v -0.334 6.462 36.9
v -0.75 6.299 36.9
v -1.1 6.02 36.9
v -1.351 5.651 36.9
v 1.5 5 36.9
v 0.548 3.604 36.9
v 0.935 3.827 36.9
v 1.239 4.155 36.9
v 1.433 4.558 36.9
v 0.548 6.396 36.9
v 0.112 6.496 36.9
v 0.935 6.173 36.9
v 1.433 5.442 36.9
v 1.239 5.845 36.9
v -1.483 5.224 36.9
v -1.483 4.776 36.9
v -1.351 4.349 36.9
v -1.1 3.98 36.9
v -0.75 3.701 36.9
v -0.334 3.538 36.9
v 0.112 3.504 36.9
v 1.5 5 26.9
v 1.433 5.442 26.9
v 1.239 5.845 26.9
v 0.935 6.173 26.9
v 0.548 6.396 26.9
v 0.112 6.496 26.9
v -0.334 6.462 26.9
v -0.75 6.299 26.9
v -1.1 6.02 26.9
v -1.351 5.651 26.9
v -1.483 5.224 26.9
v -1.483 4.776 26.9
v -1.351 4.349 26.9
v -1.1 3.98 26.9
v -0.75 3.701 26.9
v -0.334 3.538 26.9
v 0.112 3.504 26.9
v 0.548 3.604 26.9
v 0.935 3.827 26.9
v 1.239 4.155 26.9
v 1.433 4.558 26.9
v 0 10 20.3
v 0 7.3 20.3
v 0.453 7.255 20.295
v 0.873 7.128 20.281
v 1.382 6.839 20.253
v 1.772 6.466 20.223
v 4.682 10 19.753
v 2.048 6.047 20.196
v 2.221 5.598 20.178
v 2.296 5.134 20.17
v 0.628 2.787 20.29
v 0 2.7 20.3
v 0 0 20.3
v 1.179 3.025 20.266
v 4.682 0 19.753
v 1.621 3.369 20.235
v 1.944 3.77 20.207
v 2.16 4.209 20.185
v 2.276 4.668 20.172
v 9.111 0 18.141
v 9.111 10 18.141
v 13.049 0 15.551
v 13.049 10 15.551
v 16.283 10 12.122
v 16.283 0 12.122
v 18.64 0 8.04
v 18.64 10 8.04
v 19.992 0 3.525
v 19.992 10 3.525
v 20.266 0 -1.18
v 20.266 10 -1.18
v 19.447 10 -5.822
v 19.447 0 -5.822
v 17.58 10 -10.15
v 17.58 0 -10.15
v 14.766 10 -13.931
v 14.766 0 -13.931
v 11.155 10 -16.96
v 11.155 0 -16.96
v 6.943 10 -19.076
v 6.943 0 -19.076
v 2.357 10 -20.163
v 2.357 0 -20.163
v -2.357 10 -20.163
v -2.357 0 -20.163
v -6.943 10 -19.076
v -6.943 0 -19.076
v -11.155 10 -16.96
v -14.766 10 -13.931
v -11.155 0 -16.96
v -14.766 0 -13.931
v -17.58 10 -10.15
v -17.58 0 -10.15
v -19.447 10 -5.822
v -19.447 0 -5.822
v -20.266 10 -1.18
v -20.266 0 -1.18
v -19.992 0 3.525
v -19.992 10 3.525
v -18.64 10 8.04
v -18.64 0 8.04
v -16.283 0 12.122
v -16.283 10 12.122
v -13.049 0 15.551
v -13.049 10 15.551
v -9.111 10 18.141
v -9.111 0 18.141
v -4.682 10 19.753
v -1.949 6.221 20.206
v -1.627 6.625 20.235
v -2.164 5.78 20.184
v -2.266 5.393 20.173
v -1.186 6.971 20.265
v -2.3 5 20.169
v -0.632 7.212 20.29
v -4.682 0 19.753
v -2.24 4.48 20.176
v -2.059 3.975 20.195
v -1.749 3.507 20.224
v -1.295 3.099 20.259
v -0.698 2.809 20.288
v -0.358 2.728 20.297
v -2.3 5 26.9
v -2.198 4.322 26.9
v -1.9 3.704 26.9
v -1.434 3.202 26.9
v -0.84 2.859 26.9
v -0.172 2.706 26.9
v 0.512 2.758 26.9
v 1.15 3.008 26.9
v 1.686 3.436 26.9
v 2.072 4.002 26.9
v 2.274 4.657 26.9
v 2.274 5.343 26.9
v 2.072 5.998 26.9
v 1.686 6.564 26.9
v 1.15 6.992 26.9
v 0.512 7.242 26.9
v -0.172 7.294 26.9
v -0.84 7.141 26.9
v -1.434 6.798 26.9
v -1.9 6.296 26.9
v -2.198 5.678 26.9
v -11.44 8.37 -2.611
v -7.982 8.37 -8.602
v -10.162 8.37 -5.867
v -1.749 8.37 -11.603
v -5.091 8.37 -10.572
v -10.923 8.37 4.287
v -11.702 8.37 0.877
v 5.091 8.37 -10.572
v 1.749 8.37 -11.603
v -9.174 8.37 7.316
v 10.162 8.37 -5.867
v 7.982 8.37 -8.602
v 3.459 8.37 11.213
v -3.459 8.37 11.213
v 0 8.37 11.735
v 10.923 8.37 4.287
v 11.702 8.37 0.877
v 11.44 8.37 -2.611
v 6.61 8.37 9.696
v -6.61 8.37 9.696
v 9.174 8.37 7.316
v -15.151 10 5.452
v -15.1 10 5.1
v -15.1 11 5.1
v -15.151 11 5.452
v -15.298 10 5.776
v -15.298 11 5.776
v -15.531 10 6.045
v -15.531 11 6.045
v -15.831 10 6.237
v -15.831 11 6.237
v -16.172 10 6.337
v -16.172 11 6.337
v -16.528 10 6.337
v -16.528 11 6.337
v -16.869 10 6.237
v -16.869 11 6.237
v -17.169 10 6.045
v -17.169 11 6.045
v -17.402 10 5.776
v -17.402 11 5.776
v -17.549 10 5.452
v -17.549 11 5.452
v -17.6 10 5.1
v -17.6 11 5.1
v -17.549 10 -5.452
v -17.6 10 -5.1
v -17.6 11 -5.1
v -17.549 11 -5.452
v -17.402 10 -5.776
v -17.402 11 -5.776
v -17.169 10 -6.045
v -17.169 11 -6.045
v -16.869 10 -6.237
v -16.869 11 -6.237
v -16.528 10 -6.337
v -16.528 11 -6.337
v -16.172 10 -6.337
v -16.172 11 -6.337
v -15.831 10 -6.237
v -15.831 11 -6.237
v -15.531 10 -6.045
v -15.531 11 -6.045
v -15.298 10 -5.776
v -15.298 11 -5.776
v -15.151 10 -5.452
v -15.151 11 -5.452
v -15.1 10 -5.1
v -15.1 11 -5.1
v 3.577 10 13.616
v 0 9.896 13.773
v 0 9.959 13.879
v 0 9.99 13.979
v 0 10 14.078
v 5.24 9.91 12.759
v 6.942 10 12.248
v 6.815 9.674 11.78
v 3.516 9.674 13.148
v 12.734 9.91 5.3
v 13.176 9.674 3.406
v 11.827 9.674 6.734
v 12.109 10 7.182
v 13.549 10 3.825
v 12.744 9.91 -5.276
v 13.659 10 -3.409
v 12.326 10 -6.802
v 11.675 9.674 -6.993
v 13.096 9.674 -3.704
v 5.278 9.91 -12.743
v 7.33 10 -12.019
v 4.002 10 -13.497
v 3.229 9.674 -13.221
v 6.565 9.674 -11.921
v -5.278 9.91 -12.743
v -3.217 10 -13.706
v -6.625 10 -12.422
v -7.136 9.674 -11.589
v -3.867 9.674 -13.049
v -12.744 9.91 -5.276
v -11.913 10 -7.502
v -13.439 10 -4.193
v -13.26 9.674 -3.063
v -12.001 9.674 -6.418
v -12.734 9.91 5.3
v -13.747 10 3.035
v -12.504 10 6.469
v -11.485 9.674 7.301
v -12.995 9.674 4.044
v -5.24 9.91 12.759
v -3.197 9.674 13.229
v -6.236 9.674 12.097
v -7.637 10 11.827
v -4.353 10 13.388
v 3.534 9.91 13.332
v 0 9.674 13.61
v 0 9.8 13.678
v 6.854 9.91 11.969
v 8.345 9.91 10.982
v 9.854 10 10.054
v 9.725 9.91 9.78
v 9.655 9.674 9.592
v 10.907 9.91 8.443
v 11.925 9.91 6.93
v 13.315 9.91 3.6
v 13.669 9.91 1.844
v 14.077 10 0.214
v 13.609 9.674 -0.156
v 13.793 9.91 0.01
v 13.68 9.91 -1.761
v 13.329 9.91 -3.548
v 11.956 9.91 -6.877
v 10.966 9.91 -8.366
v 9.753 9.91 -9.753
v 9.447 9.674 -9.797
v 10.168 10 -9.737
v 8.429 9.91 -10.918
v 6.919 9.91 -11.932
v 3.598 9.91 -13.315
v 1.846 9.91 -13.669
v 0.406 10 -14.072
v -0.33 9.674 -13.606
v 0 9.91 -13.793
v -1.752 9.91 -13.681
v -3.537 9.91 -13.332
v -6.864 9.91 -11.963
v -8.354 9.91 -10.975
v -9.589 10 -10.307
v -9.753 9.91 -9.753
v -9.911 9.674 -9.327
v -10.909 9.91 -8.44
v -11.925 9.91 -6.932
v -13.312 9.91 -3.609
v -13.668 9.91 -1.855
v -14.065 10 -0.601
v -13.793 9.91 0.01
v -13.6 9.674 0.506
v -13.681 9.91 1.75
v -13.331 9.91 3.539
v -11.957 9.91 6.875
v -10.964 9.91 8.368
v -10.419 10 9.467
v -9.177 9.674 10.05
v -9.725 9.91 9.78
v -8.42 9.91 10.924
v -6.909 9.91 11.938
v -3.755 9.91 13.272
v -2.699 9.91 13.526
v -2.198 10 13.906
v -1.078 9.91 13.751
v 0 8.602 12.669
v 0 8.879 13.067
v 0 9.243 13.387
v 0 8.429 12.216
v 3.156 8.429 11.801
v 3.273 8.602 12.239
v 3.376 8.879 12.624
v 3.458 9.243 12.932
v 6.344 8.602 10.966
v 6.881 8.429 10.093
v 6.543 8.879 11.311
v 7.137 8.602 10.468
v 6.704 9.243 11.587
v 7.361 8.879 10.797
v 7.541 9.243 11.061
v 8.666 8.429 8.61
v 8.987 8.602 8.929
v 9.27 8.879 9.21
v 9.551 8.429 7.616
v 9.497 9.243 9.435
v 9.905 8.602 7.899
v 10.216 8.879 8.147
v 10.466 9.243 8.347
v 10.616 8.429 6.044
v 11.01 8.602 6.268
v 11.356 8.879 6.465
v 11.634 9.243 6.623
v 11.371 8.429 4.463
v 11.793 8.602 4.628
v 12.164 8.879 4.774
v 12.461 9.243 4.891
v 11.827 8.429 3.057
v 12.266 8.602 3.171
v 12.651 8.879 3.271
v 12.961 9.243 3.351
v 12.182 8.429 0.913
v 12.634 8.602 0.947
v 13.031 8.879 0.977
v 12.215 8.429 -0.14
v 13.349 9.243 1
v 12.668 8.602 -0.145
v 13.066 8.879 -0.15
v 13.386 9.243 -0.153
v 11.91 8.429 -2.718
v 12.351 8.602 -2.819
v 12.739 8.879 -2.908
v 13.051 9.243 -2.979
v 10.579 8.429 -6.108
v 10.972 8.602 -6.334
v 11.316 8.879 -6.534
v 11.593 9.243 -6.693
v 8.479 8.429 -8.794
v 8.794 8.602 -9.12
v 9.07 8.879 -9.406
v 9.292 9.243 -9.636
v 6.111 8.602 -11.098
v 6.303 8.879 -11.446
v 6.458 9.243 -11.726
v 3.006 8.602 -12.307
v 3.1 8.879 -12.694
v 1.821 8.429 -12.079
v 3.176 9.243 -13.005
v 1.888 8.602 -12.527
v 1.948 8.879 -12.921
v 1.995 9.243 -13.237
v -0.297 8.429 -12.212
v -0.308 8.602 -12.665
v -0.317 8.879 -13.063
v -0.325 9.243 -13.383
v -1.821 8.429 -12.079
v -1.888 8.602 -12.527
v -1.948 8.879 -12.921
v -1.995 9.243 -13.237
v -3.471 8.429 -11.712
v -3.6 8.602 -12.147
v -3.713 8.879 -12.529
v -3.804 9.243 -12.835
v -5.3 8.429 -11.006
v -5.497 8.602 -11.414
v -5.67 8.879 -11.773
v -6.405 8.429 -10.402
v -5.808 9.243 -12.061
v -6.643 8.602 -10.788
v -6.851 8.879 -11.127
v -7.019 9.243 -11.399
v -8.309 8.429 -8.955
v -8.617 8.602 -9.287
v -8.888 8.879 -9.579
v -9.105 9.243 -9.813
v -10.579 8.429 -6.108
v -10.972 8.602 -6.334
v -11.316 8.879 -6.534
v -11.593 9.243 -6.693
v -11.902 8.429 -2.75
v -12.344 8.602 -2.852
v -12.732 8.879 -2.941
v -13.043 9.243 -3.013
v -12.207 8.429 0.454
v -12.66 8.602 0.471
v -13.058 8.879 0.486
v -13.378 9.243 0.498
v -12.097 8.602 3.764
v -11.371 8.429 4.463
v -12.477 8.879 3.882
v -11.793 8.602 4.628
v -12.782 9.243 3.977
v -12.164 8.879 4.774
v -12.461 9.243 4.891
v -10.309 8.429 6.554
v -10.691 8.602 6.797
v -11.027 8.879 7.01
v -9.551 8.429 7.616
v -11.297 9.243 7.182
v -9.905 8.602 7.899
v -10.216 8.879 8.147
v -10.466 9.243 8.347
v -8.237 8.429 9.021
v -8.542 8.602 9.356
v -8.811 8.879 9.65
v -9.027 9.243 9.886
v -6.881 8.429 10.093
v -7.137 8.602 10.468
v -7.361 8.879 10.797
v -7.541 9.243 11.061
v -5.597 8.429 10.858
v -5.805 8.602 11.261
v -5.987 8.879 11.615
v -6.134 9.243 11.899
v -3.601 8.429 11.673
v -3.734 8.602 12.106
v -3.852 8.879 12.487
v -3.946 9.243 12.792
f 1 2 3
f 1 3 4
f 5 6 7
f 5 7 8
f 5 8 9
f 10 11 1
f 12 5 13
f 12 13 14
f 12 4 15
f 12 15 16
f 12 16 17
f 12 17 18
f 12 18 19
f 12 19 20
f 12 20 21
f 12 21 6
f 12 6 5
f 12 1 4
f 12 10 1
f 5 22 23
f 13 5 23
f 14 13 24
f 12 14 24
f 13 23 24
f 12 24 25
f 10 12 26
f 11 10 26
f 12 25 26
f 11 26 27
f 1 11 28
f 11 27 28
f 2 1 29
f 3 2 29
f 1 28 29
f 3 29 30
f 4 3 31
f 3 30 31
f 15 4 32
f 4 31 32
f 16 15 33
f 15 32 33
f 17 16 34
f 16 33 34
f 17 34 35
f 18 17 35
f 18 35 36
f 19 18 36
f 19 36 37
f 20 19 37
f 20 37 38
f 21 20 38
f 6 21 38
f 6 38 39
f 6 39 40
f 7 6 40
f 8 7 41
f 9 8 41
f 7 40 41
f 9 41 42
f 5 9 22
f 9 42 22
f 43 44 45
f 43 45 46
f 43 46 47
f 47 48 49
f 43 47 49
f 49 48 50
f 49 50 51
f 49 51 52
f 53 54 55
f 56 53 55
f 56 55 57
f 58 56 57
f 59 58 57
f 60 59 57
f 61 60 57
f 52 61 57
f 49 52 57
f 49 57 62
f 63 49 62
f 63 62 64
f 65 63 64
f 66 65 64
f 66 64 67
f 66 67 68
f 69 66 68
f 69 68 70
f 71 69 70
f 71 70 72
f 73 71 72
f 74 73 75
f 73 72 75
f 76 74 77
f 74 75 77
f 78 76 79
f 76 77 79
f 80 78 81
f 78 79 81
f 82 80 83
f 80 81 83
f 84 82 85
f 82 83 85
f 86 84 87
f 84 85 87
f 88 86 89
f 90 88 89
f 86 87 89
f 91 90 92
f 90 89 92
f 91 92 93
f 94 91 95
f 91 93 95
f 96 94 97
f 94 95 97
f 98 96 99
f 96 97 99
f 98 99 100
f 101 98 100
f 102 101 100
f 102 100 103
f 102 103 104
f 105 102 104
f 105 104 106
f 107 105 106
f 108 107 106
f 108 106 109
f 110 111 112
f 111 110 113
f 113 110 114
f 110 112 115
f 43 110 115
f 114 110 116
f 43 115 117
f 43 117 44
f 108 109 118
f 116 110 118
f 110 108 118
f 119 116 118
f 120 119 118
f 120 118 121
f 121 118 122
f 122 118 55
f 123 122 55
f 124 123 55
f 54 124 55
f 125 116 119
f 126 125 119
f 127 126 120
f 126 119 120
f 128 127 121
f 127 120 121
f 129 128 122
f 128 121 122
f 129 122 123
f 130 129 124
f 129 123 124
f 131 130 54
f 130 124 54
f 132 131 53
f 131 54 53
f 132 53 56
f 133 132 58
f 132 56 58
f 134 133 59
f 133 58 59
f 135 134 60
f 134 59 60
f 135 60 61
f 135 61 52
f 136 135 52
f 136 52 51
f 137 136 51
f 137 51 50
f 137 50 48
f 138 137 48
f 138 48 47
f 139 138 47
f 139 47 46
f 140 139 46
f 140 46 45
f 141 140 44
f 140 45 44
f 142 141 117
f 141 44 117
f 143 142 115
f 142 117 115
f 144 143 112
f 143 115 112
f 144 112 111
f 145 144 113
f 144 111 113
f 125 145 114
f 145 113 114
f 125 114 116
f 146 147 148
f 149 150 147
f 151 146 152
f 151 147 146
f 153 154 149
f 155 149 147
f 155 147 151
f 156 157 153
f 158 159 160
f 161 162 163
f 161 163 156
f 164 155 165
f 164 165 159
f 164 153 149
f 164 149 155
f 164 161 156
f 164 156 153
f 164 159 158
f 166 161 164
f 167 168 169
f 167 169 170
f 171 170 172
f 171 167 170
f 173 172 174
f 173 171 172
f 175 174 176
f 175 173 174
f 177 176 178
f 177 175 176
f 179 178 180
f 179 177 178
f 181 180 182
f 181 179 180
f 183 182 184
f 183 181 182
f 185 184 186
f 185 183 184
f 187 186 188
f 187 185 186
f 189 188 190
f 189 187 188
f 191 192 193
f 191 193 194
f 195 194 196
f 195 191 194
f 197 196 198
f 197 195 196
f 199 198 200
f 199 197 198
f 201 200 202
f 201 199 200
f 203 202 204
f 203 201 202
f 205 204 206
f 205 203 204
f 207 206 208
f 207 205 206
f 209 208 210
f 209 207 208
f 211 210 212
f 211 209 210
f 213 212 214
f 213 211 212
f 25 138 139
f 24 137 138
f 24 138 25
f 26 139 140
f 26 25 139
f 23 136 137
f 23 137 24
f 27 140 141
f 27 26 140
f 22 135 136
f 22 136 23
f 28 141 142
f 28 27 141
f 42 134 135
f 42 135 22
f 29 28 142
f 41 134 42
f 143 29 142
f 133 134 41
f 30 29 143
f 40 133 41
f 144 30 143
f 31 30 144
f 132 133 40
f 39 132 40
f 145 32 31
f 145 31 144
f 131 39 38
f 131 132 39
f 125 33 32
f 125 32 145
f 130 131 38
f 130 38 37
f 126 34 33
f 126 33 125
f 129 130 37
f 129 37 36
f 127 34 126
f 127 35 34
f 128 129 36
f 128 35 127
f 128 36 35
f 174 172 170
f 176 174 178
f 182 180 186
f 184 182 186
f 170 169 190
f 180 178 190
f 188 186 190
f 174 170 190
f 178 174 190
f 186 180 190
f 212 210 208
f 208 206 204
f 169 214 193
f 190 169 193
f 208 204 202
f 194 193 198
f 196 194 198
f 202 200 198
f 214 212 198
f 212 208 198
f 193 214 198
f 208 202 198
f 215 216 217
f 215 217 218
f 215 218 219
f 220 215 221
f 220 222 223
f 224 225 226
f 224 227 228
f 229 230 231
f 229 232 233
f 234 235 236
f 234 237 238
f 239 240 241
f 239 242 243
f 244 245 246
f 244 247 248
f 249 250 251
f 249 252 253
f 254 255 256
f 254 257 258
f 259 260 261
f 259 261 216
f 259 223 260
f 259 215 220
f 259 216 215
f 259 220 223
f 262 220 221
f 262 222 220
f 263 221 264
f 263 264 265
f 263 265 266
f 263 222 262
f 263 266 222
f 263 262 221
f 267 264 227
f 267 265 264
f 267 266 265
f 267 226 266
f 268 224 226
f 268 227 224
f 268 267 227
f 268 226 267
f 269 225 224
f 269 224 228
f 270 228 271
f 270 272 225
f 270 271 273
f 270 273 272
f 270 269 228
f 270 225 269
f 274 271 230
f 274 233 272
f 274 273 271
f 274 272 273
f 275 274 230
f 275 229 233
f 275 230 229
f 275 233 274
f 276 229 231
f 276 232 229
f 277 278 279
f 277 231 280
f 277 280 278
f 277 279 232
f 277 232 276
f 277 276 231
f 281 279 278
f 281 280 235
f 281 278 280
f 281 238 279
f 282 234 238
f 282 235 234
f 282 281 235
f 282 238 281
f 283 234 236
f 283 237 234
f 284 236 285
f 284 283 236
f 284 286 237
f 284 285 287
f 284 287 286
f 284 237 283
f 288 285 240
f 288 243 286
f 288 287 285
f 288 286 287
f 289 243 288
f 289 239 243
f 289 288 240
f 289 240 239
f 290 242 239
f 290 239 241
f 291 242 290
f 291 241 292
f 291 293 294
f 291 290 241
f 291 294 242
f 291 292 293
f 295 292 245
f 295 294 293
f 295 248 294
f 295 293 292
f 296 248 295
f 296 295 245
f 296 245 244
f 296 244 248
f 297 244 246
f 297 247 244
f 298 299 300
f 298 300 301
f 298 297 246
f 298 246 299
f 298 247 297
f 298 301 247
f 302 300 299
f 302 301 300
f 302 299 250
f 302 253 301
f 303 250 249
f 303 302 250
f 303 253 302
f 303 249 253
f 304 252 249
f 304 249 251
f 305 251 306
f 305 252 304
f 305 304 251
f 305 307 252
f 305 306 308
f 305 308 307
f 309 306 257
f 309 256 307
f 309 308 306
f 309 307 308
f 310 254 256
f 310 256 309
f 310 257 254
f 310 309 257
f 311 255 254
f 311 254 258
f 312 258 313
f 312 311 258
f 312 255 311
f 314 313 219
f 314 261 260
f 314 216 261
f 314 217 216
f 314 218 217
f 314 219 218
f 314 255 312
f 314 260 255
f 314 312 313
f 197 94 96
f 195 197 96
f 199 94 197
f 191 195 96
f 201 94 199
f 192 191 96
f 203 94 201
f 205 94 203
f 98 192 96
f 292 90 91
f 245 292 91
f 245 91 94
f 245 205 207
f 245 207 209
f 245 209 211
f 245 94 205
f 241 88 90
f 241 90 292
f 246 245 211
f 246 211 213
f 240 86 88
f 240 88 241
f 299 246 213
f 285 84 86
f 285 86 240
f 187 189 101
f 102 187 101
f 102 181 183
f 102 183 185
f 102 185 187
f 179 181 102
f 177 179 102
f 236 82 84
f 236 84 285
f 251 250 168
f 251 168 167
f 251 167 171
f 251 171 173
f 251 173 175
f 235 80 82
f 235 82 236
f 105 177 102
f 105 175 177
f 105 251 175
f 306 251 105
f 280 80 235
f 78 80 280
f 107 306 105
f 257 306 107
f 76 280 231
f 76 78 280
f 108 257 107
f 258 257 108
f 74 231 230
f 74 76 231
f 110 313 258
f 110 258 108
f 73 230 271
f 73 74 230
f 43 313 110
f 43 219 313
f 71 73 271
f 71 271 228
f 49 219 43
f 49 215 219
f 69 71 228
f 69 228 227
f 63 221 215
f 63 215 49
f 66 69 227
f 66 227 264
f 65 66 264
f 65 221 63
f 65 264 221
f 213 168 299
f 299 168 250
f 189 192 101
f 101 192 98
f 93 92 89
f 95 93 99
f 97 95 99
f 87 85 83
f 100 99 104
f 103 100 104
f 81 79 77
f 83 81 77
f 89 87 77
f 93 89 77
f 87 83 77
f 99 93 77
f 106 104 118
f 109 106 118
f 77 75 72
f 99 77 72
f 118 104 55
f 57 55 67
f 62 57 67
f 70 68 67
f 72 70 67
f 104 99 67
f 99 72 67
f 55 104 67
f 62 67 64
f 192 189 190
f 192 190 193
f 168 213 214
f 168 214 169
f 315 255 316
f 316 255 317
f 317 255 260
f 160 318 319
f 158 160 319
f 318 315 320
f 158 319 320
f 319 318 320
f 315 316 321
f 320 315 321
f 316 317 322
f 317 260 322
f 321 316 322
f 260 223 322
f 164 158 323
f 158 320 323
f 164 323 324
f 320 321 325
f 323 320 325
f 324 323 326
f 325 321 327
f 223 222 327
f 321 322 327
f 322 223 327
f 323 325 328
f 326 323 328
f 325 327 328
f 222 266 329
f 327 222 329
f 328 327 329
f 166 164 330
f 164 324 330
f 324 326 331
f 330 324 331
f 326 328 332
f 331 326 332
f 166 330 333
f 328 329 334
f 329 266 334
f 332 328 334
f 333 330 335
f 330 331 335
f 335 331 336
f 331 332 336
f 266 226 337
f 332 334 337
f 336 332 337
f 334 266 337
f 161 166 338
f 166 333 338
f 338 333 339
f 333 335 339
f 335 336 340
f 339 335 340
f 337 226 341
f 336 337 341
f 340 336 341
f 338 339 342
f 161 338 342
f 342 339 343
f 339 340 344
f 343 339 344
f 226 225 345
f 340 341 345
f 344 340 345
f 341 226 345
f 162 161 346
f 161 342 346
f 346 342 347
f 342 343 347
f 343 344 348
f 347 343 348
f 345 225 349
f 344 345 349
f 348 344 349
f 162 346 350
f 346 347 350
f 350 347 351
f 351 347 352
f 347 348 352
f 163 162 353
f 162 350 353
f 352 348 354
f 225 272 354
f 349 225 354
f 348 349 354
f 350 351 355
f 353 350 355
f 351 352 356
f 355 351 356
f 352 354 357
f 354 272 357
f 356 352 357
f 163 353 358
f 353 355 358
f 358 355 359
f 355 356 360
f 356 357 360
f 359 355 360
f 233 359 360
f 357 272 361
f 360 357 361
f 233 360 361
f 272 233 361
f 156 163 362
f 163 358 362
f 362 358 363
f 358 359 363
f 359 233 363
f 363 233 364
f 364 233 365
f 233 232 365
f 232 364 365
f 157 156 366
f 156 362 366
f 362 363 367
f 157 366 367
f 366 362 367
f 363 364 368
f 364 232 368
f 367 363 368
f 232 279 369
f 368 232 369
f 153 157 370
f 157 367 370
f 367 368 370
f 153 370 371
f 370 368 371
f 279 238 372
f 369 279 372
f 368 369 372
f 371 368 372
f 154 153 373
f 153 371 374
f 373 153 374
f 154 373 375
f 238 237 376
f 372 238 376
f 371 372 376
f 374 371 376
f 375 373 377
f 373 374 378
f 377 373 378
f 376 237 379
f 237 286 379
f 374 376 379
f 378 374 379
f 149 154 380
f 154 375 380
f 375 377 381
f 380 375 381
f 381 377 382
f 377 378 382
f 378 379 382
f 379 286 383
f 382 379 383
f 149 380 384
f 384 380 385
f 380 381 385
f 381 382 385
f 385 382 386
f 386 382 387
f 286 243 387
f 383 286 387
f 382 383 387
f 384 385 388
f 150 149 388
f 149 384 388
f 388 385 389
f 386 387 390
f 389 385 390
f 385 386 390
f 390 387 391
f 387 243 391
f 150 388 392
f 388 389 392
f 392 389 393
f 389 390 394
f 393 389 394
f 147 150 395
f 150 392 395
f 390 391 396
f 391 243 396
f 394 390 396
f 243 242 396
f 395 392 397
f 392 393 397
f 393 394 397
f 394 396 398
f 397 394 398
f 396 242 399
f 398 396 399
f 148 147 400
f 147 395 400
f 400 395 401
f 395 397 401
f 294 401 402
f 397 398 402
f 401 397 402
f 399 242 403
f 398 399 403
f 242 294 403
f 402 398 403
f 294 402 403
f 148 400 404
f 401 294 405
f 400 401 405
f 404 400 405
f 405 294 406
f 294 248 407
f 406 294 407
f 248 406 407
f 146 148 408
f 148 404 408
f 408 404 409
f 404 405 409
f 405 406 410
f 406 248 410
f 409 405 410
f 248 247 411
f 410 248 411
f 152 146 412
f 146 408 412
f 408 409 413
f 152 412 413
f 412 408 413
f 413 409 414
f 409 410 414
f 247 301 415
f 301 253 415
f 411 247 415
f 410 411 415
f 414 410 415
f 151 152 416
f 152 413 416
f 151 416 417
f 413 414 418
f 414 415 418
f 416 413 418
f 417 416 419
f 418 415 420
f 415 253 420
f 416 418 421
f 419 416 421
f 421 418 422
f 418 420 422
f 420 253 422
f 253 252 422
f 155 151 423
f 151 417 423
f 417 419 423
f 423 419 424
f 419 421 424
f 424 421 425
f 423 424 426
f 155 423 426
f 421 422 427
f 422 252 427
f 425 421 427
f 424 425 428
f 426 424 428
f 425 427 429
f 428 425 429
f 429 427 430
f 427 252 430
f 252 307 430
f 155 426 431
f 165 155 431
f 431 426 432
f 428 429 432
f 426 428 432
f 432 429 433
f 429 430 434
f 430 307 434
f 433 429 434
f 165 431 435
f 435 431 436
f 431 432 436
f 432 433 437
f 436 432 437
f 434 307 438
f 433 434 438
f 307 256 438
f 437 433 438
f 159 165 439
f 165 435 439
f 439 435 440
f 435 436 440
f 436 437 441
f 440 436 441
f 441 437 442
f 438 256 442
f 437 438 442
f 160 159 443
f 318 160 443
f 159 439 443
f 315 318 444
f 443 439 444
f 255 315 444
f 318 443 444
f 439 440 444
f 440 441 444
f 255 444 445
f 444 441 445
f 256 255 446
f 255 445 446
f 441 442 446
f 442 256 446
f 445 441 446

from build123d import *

# Parameters (mm, degrees)
SKETCH_1_R          = 20.3
EXTRUDE_1_DEPTH     = 10
SKETCH_2_R          = 2.3
EXTRUDE_2_DEPTH     = 26.9
SKETCH_3_R          = 1.5
EXTRUDE_3_DEPTH     = 10
EXTRUDE_4_DEPTH     = 1
SKETCH_5_R          = 13.7
CUT_EXTRUDE_1_DEPTH = 1.63
FILLET_1_R          = 2
FILLET_2_R          = 0.5


with BuildPart() as part:
    # 草图1 → 凸台-拉伸1 (new body)
    with BuildSketch(Plane(origin=(0, 0, 0), x_dir=(1, 0, 0), z_dir=(0, 1, 0))):
        with Locations(Location((0, 0, 0), (0, 0, 270))):
            Circle(SKETCH_1_R)
    extrude(amount=EXTRUDE_1_DEPTH)

    # 草图2 → 凸台-拉伸2 (add)
    with BuildSketch(Plane.XY):
        with Locations(Location((0, 5, 0), (0, 0, 180))):
            Circle(SKETCH_2_R)
    extrude(amount=EXTRUDE_2_DEPTH)

    # 草图3 → 凸台-拉伸3 (add)
    with BuildSketch(Plane.XY.offset(26.9)):
        with Locations((0, 5)):
            Circle(SKETCH_3_R)
    extrude(amount=EXTRUDE_3_DEPTH)

    # 草图4 → 凸台-拉伸4 (add)
    with BuildSketch(Plane(origin=(0, 10, 0), x_dir=(1, 0, 0), z_dir=(0, 1, 0))):
        with BuildLine():
            Line((-15.1, 5.1), (-15.1, -5.1))
            ThreePointArc((-15.1, -5.1), (-16.35, -6.35), (-17.6, -5.1))
            Line((-17.6, -5.1), (-17.6, 5.1))
            ThreePointArc((-17.6, 5.1), (-16.35, 6.35), (-15.1, 5.1))
        make_face()
    extrude(amount=EXTRUDE_4_DEPTH)

    # 草图5 → 切除-拉伸1 (cut)
    with BuildSketch(Plane(origin=(0, 10, 0), x_dir=(1, 0, 0), z_dir=(0, 1, 0))):
        with Locations(Location((0, 0, 0), (0, 0, 270))):
            Circle(SKETCH_5_R)
    extrude(amount=-CUT_EXTRUDE_1_DEPTH, mode=Mode.SUBTRACT)

    # 圆角1
    # the kernel refuses this fillet: 2 mm, written as the material it adds along each edge
    with BuildSketch(Plane(origin=(0, 8.37, 0), x_dir=(0, 0, 1), z_dir=(-1, 0, 0))) as fillet_1_piece_1:
        with BuildLine():
            CenterArc((11.734522959, 2), FILLET_1_R, 270, 79.338867602)
            Line((11.734522959, 0), (11.734522959, -0.04))
            Line((11.734522959, -0.04), (13.7, -0.04))
            Line((13.7, -0.04), (13.74, 0))
            ThreePointArc((13.74, 0), (13.74, 0.815), (13.739309541, 1.6226))
            Line((13.739309541, 1.6226), (13.7, 1.63))
        make_face()
    revolve(axis=Axis((0, 8.37, 0), (0, 1, 0)))

    # 圆角2
    fillet_2_edges = [part.edges().sort_by_distance(p)[0] for p in [
        (0, 10, -13.7),
    ]]
    fillet(fillet_2_edges, radius=FILLET_2_R)


solid = part.part
